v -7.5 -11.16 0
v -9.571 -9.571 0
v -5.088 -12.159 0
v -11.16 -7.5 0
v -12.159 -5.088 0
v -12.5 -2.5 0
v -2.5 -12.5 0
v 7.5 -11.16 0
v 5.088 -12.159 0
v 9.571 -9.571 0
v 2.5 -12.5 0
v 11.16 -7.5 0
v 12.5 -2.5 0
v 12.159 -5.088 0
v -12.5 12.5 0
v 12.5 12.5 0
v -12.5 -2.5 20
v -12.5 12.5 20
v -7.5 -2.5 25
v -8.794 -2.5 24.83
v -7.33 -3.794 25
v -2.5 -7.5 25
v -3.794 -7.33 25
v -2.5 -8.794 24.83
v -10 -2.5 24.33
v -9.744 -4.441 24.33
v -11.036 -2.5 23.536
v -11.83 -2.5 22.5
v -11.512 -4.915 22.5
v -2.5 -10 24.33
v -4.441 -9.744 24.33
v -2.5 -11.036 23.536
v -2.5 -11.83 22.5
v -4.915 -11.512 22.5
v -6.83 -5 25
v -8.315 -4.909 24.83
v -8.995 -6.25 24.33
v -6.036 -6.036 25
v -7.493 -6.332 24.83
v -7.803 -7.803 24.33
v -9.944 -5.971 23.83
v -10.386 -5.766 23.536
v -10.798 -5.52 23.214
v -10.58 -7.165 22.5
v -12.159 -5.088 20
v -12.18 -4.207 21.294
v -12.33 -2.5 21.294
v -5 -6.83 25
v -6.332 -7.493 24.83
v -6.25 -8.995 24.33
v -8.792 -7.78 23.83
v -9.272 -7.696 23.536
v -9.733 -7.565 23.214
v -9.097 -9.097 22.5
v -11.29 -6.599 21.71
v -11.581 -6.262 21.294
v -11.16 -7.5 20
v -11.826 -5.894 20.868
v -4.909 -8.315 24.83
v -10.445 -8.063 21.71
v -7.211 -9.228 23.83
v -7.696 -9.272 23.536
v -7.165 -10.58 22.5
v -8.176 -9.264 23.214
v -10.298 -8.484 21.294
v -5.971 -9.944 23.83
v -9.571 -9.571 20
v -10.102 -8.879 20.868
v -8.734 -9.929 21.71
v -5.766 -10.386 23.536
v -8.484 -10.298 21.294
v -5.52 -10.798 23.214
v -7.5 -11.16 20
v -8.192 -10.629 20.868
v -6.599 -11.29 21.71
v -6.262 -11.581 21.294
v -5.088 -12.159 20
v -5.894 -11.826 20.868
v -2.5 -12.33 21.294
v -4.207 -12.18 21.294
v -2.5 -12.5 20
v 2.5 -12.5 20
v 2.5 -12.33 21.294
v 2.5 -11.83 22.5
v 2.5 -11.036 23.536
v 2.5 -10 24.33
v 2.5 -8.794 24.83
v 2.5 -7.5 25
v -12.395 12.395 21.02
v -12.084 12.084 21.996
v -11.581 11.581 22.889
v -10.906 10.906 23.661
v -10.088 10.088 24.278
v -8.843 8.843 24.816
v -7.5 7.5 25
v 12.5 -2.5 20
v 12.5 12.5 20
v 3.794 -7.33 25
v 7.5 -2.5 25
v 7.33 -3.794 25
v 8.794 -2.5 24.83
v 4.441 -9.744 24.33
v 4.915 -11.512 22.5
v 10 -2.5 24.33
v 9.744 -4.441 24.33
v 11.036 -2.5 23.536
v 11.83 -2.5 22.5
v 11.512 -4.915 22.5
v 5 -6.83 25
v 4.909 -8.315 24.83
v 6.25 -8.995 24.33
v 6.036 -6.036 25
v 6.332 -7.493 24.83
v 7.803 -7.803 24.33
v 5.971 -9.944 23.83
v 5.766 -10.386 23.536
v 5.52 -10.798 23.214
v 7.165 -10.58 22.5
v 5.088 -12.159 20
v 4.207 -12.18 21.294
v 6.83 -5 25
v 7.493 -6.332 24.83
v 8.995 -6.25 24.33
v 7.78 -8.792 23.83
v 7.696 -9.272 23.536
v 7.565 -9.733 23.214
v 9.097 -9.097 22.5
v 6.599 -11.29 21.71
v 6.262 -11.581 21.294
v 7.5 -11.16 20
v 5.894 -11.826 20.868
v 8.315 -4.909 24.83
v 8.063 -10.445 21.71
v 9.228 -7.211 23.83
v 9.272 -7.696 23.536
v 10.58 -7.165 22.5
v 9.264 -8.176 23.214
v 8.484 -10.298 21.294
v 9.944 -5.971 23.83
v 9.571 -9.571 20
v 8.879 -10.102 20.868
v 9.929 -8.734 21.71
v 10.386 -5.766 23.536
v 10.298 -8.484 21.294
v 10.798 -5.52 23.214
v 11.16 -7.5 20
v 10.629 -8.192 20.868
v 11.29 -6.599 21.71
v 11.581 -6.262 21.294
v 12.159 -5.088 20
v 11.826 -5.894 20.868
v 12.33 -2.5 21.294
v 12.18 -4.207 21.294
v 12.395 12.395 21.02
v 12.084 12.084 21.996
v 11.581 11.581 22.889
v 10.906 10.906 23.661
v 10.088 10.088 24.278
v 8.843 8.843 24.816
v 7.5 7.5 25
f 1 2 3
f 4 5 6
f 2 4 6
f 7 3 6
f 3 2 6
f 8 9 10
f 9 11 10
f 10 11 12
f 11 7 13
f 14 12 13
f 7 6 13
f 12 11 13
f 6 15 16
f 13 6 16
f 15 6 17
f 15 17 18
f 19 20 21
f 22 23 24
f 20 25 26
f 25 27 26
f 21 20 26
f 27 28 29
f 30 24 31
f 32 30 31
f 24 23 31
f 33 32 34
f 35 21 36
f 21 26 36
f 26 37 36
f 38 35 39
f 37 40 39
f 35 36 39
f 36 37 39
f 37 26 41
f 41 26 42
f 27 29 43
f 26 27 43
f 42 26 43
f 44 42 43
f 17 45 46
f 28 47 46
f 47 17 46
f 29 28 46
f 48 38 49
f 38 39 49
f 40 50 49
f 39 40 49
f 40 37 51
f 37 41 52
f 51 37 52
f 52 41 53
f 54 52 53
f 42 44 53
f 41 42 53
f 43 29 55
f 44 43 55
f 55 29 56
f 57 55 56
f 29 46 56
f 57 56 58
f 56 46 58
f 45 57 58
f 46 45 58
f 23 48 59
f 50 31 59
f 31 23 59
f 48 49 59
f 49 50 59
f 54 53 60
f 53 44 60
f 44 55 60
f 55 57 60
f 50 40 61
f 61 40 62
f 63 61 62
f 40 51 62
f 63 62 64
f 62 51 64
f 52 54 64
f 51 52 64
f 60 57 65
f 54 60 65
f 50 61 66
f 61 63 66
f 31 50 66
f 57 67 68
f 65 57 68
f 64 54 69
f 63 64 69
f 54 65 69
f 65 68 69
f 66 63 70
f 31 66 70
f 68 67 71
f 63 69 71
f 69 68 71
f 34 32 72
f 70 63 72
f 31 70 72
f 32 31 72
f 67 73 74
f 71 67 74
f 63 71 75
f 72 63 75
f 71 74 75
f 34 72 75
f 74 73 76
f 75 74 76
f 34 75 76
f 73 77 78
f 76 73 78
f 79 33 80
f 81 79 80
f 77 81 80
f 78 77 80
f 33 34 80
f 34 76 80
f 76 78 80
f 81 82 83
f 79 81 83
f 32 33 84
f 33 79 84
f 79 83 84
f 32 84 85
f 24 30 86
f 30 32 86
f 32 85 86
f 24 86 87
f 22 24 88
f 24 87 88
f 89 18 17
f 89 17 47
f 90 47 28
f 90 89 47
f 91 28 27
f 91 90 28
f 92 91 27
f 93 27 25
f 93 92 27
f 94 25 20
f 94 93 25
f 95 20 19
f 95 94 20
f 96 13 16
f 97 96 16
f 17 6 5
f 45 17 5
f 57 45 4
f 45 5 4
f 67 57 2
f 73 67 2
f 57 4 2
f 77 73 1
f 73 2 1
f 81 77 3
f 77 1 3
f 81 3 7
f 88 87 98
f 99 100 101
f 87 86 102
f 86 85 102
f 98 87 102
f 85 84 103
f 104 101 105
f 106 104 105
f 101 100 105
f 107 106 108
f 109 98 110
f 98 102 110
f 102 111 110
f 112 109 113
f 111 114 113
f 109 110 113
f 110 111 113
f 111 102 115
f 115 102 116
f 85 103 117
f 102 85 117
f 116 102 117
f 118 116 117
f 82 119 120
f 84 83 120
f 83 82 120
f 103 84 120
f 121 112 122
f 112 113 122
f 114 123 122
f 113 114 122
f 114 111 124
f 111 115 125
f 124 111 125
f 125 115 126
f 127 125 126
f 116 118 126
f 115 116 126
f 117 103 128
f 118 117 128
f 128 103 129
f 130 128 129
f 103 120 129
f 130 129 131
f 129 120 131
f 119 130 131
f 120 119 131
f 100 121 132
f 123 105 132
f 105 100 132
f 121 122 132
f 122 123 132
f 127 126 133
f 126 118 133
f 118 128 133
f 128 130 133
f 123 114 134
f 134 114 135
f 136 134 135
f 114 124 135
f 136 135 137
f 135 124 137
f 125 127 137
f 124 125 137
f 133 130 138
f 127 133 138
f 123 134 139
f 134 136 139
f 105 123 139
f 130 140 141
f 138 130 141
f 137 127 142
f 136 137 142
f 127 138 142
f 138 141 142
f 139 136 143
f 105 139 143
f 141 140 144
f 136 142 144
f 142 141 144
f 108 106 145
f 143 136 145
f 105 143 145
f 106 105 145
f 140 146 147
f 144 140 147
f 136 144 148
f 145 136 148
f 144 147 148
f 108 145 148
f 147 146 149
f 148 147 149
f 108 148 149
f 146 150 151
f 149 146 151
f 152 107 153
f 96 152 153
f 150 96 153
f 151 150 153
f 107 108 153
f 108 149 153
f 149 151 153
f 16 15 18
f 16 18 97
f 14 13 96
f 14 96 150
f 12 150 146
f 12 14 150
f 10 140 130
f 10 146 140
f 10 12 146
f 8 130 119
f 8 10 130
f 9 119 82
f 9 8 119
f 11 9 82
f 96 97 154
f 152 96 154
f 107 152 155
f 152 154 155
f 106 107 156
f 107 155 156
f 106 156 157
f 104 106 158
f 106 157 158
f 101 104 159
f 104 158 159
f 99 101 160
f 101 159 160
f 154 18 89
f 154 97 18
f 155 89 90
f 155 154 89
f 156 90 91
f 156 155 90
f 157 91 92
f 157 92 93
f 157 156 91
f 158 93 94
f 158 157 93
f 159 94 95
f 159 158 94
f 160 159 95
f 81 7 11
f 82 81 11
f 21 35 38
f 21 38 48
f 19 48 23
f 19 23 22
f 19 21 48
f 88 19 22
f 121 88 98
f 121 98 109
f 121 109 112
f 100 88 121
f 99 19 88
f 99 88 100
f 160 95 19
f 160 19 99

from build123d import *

# Parameters (mm, degrees)
F0_W        = 25
F0_H        = 25
F1_DEPTH    = 25
F2_R        = 5
F3_T1_DEPTH = 25
F3_T4_ANGLE = 90
F3_T6_ANGLE = 90


# Not quite as in the source:
# - a fillet or chamfer that OpenCascade refuses, or shapes differently, is made with other operations: its cross-section is extruded or revolved along the edge and cut away or added


with BuildPart() as f1:
    # F0 (on Top) → F1 (new body)
    with BuildSketch(Plane.XY):
        Rectangle(F0_W, F0_H)
    extrude(amount=F1_DEPTH)

    # F2
    f2_edges = [f1.edges().sort_by_distance(p)[0] for p in [
        (0, 12.5, 25),
        (-12.5, 0, 25),
        (0, -12.5, 25),
        (12.5, 0, 25),
    ]]
    fillet(f2_edges, radius=F2_R)

    # F3: fillet of radius 10 on 2 edges, made by hand

    # F3_s2 → F3_t1 (cut)
    with BuildSketch(Plane.XY):
        with BuildLine():
            ThreePointArc((12.5, -2.5), (9.5710678119, -9.5710678119), (2.5, -12.5))
            Line((2.5, -12.5), (2.5, -12.7))
            Line((2.5, -12.7), (12.7, -12.7))
            Line((12.7, -12.7), (12.7, -2.5))
            Line((12.7, -2.5), (12.5, -2.5))
        make_face()
        with BuildLine():
            ThreePointArc((-12.5, -2.5), (-9.5710678119, -9.5710678119), (-2.5, -12.5))
            Line((-2.5, -12.5), (-2.5, -12.7))
            Line((-2.5, -12.7), (-12.7, -12.7))
            Line((-12.7, -12.7), (-12.7, -2.5))
            Line((-12.7, -2.5), (-12.5, -2.5))
        make_face()
    extrude(amount=F3_T1_DEPTH, mode=Mode.SUBTRACT)

    # F3_s3 → F3_t4 (revolve, cut)
    with BuildSketch(Plane.XZ.offset(2.5)):
        with BuildLine():
            ThreePointArc((-7.5, 25), (-11.0355339059, 23.5355339059), (-12.5, 20))
            Line((-12.5, 20), (-12.5, 25))
            Line((-12.5, 25), (-7.5, 25))
        make_face()
    revolve(axis=Axis((-2.5, -2.5, 25), (0, 0, 1)), revolution_arc=F3_T4_ANGLE, mode=Mode.SUBTRACT)

    # F3_s5 → F3_t6 (revolve, cut)
    with BuildSketch(Plane.YZ.offset(2.5)):
        with BuildLine():
            ThreePointArc((-7.5, 25), (-11.0355339059, 23.5355339059), (-12.5, 20))
            Line((-12.5, 20), (-12.5, 25))
            Line((-12.5, 25), (-7.5, 25))
        make_face()
    revolve(axis=Axis((2.5, -2.5, 25), (0, 0, 1)), revolution_arc=F3_T6_ANGLE, mode=Mode.SUBTRACT)


solid = f1.part
